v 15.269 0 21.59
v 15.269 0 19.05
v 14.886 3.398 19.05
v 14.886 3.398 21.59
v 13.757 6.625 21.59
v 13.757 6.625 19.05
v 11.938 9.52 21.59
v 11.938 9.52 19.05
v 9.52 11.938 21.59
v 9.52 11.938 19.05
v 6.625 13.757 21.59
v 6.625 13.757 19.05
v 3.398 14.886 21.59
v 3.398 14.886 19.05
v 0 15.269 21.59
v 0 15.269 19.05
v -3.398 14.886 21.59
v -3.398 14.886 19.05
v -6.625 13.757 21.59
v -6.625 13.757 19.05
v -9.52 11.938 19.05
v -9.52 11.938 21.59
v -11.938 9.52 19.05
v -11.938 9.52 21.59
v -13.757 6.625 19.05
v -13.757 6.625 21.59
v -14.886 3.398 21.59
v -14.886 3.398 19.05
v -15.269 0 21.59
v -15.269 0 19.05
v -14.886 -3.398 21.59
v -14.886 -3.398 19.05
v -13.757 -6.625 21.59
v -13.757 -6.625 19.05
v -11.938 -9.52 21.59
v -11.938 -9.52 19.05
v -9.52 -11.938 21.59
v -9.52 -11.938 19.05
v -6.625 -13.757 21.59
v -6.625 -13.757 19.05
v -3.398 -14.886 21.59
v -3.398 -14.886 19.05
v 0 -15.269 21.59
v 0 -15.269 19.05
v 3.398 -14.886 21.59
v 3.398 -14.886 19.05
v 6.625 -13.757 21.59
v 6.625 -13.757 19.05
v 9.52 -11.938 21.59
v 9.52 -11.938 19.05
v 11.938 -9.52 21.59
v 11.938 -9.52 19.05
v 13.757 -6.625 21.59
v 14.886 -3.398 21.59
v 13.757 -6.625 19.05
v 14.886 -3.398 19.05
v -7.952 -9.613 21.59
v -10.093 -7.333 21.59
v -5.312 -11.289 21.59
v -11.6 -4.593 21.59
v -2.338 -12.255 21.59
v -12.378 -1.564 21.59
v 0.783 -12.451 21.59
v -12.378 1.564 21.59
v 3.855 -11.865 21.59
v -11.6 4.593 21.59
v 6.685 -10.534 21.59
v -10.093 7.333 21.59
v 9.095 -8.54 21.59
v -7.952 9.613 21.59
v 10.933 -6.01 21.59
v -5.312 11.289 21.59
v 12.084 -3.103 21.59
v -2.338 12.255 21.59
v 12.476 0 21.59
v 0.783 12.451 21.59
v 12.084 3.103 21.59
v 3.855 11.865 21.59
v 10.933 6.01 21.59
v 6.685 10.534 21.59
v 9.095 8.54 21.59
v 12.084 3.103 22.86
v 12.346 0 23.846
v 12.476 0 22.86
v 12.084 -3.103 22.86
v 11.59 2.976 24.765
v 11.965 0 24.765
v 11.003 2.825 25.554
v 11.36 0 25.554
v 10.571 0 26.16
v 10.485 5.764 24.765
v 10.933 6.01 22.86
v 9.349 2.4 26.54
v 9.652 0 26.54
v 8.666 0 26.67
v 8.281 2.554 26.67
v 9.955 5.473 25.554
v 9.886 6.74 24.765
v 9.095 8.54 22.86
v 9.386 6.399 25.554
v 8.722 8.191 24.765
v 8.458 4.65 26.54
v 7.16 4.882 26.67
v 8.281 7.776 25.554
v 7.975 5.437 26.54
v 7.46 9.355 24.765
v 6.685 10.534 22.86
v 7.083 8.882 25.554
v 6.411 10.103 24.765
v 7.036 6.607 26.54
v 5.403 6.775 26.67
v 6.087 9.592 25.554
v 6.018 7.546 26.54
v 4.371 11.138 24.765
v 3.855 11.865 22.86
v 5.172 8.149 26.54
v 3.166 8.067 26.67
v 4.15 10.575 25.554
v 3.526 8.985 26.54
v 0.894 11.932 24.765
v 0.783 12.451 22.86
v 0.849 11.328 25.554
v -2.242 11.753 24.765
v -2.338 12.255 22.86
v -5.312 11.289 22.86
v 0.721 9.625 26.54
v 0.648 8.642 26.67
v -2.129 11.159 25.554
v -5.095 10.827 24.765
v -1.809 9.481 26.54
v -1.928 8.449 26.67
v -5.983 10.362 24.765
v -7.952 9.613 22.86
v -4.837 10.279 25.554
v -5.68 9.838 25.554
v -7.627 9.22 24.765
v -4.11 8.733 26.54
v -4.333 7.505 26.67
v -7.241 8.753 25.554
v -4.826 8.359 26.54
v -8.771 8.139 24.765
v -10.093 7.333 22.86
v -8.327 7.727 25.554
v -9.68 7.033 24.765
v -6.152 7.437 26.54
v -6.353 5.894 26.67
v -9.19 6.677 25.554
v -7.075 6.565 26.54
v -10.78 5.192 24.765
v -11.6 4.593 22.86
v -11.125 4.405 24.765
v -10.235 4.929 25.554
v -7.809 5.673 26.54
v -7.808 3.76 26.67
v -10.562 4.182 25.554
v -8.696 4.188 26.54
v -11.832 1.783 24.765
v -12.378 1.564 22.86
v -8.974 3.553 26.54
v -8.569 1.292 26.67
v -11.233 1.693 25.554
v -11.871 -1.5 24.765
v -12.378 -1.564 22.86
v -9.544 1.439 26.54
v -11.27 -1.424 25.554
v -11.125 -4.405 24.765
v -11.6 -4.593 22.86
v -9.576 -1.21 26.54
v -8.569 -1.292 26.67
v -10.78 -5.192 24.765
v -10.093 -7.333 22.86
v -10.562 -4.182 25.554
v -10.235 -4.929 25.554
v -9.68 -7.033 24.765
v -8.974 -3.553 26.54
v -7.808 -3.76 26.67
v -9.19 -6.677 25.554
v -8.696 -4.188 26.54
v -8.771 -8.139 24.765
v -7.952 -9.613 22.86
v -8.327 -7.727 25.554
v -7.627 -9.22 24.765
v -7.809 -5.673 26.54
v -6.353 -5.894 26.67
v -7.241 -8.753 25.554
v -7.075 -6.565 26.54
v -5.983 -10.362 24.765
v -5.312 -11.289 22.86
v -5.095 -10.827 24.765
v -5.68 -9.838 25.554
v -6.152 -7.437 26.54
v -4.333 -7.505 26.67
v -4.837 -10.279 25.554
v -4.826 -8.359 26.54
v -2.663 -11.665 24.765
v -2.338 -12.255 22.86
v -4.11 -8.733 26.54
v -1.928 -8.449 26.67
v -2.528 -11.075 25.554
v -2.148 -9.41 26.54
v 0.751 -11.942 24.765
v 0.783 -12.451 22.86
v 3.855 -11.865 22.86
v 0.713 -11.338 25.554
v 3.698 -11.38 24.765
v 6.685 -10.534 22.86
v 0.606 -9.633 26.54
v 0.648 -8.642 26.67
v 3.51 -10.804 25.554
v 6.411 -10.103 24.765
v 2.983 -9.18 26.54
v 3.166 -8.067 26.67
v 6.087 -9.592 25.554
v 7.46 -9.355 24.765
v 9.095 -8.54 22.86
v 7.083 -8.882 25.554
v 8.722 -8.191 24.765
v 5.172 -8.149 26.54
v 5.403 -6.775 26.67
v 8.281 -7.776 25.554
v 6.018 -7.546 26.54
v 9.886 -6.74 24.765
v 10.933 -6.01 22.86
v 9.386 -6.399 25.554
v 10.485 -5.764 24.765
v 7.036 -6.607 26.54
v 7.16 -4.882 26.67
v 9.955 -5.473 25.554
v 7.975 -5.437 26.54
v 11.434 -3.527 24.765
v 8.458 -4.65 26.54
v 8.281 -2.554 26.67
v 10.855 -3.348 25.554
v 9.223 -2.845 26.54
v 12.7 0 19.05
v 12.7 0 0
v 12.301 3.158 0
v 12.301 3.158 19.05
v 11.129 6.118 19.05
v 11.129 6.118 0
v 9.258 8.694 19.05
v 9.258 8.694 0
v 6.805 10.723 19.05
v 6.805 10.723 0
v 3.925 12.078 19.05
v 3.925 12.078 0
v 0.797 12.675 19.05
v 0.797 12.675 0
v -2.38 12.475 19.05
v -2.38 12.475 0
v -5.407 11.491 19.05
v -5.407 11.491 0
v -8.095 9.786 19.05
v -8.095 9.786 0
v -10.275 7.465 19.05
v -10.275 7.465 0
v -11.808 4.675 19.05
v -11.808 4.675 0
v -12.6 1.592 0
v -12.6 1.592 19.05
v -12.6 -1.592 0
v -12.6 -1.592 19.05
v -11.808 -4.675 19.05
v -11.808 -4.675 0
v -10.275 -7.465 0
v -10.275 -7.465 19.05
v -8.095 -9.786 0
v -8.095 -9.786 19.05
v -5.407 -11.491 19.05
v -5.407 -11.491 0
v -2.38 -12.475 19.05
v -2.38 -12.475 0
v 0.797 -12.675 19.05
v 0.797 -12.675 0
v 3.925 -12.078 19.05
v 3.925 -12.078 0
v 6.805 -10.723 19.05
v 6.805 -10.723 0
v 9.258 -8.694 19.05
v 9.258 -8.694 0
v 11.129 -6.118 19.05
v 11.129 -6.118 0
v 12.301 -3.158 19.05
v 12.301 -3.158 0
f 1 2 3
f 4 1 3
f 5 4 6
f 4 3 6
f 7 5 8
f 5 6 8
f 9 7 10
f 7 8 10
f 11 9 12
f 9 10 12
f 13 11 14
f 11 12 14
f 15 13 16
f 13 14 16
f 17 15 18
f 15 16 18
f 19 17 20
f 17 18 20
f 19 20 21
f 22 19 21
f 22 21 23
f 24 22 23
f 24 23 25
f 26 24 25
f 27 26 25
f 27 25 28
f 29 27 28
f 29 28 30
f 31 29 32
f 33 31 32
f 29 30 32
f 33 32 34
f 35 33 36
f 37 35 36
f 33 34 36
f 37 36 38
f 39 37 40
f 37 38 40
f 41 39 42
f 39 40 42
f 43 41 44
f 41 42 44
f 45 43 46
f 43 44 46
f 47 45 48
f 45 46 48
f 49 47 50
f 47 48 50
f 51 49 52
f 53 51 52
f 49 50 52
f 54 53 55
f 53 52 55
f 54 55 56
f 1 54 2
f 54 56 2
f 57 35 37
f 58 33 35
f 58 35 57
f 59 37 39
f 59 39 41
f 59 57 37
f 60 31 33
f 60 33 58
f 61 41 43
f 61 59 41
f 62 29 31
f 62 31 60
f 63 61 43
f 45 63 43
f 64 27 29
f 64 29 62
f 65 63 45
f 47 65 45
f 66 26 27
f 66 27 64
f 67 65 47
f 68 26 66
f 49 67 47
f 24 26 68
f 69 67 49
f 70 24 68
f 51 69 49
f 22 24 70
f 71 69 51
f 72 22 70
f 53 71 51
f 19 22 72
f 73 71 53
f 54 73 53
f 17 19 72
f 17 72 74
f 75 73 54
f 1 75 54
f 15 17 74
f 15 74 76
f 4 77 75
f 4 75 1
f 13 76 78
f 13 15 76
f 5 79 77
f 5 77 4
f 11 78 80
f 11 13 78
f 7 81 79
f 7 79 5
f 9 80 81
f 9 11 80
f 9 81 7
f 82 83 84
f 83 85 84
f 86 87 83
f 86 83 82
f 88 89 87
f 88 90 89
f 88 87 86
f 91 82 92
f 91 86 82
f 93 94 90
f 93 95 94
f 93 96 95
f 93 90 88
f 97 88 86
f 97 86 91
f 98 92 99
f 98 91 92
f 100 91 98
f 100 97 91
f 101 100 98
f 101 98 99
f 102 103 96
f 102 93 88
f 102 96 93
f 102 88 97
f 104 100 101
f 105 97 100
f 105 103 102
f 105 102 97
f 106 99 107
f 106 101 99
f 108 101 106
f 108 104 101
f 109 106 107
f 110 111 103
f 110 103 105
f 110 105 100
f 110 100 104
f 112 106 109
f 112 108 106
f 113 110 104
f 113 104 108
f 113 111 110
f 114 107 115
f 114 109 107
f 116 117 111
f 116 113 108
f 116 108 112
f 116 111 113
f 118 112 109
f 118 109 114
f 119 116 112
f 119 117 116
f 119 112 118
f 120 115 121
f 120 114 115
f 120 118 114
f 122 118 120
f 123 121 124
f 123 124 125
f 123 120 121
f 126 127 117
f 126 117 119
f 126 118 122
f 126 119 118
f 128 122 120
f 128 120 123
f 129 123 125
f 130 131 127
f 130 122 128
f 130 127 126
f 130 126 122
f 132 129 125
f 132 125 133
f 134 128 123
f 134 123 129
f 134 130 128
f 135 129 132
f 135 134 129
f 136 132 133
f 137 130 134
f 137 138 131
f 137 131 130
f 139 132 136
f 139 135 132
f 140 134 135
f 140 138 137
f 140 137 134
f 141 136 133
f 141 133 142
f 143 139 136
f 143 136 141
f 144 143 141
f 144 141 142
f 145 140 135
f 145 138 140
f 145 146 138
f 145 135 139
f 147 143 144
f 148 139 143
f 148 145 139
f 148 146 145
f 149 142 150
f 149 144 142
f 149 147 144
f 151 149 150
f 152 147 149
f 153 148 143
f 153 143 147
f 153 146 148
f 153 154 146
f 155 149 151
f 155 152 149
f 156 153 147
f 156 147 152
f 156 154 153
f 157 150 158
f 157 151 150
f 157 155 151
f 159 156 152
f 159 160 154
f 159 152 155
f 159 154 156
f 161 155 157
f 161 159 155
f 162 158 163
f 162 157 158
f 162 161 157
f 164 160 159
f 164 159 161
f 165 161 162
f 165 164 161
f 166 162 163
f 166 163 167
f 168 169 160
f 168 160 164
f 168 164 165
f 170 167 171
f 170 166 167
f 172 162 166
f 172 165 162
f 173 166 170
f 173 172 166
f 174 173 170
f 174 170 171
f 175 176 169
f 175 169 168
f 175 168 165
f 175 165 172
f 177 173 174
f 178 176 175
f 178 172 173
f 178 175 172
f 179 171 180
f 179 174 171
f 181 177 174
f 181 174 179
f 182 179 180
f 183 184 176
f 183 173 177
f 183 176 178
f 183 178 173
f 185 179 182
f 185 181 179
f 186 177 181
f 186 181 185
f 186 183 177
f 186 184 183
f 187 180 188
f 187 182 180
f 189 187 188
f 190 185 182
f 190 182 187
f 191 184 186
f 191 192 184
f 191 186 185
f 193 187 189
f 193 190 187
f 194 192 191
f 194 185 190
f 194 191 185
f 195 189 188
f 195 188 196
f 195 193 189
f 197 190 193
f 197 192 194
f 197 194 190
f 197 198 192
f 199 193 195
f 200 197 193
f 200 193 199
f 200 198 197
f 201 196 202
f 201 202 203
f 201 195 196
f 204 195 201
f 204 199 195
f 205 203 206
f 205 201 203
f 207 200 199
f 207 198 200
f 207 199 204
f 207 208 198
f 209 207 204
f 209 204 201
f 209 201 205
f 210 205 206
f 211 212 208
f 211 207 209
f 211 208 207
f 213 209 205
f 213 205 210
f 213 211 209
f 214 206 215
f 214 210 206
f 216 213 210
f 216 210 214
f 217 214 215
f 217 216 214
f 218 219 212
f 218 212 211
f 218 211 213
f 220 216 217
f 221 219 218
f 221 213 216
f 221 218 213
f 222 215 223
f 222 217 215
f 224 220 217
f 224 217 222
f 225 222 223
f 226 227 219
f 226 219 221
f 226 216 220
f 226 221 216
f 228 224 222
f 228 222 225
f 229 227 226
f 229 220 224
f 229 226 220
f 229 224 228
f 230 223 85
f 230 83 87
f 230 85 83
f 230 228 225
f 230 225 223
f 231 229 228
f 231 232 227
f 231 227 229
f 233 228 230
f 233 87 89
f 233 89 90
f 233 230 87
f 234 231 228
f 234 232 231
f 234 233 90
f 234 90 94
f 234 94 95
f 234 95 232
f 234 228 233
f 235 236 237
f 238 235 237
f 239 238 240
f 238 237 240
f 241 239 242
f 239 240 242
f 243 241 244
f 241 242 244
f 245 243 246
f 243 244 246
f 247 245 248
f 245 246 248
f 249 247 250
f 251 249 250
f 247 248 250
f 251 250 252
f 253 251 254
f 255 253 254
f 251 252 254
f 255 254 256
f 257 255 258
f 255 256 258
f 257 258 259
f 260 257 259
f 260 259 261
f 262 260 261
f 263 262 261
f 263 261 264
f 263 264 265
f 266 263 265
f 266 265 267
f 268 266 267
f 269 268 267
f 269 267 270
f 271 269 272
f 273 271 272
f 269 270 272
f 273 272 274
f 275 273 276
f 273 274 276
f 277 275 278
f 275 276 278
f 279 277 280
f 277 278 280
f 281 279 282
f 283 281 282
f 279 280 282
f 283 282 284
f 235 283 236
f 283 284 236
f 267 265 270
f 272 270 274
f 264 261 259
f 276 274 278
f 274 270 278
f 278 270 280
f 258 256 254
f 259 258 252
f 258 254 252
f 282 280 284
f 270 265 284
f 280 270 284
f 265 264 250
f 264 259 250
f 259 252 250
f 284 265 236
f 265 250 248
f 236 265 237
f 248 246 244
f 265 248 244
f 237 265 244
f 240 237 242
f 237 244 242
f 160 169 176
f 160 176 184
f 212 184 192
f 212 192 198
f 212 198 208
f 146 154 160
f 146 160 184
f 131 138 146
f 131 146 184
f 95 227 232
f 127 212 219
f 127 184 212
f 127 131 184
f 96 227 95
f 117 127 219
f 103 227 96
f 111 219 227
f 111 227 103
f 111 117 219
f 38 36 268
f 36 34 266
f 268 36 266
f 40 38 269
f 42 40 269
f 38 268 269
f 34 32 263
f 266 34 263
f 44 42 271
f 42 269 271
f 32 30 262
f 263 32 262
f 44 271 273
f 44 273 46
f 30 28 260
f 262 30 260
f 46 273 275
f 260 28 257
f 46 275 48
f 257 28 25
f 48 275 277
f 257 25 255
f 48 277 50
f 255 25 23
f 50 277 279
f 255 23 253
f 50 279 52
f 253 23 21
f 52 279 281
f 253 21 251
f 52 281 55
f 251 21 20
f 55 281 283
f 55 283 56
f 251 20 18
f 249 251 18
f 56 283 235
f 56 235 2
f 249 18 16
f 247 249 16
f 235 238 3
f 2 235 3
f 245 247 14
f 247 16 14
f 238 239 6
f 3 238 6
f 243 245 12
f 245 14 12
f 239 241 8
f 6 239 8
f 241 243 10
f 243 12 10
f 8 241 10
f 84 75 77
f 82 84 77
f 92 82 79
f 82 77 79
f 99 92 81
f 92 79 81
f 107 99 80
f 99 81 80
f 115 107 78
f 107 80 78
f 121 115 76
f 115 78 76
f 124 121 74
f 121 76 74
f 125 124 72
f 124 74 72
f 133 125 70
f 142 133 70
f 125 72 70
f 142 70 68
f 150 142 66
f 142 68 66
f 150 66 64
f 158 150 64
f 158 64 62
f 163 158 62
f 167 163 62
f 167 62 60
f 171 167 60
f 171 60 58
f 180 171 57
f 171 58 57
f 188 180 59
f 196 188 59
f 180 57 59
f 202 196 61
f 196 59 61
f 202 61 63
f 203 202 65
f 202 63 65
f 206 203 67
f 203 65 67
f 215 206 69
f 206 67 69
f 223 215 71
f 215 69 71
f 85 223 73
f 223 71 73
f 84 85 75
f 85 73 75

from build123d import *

# Parameters (mm, degrees)
F0_R     = 12.7
F1_DEPTH = 19.05
F2_R     = 15.2691244528
F2_R_2   = 12.7
F3_DEPTH = 2.54
F4_R     = 12.475880284
F5_DEPTH = 5.08
F6_R     = 3.81


with BuildPart() as f1:
    # F0 (on Top) → F1 (new body)
    with BuildSketch(Plane.XY):
        Circle(F0_R)
    extrude(amount=F1_DEPTH)

    # F2 (on face) → F3 (join)
    with BuildSketch(Plane.XY.offset(19.05)):
        Circle(F2_R)
        Circle(F2_R_2, mode=Mode.SUBTRACT)
        Circle(F2_R_2)
    extrude(amount=F3_DEPTH)

    # F4 (on face) → F5 (join)
    with BuildSketch(Plane.XY.offset(21.59)):
        Circle(F4_R)
    extrude(amount=F5_DEPTH)

    # F6
    f6_edges = [f1.edges().sort_by_distance(p)[0] for p in [
        (-12.47588, 0, 26.67),
    ]]
    fillet(f6_edges, radius=F6_R)


solid = f1.part
